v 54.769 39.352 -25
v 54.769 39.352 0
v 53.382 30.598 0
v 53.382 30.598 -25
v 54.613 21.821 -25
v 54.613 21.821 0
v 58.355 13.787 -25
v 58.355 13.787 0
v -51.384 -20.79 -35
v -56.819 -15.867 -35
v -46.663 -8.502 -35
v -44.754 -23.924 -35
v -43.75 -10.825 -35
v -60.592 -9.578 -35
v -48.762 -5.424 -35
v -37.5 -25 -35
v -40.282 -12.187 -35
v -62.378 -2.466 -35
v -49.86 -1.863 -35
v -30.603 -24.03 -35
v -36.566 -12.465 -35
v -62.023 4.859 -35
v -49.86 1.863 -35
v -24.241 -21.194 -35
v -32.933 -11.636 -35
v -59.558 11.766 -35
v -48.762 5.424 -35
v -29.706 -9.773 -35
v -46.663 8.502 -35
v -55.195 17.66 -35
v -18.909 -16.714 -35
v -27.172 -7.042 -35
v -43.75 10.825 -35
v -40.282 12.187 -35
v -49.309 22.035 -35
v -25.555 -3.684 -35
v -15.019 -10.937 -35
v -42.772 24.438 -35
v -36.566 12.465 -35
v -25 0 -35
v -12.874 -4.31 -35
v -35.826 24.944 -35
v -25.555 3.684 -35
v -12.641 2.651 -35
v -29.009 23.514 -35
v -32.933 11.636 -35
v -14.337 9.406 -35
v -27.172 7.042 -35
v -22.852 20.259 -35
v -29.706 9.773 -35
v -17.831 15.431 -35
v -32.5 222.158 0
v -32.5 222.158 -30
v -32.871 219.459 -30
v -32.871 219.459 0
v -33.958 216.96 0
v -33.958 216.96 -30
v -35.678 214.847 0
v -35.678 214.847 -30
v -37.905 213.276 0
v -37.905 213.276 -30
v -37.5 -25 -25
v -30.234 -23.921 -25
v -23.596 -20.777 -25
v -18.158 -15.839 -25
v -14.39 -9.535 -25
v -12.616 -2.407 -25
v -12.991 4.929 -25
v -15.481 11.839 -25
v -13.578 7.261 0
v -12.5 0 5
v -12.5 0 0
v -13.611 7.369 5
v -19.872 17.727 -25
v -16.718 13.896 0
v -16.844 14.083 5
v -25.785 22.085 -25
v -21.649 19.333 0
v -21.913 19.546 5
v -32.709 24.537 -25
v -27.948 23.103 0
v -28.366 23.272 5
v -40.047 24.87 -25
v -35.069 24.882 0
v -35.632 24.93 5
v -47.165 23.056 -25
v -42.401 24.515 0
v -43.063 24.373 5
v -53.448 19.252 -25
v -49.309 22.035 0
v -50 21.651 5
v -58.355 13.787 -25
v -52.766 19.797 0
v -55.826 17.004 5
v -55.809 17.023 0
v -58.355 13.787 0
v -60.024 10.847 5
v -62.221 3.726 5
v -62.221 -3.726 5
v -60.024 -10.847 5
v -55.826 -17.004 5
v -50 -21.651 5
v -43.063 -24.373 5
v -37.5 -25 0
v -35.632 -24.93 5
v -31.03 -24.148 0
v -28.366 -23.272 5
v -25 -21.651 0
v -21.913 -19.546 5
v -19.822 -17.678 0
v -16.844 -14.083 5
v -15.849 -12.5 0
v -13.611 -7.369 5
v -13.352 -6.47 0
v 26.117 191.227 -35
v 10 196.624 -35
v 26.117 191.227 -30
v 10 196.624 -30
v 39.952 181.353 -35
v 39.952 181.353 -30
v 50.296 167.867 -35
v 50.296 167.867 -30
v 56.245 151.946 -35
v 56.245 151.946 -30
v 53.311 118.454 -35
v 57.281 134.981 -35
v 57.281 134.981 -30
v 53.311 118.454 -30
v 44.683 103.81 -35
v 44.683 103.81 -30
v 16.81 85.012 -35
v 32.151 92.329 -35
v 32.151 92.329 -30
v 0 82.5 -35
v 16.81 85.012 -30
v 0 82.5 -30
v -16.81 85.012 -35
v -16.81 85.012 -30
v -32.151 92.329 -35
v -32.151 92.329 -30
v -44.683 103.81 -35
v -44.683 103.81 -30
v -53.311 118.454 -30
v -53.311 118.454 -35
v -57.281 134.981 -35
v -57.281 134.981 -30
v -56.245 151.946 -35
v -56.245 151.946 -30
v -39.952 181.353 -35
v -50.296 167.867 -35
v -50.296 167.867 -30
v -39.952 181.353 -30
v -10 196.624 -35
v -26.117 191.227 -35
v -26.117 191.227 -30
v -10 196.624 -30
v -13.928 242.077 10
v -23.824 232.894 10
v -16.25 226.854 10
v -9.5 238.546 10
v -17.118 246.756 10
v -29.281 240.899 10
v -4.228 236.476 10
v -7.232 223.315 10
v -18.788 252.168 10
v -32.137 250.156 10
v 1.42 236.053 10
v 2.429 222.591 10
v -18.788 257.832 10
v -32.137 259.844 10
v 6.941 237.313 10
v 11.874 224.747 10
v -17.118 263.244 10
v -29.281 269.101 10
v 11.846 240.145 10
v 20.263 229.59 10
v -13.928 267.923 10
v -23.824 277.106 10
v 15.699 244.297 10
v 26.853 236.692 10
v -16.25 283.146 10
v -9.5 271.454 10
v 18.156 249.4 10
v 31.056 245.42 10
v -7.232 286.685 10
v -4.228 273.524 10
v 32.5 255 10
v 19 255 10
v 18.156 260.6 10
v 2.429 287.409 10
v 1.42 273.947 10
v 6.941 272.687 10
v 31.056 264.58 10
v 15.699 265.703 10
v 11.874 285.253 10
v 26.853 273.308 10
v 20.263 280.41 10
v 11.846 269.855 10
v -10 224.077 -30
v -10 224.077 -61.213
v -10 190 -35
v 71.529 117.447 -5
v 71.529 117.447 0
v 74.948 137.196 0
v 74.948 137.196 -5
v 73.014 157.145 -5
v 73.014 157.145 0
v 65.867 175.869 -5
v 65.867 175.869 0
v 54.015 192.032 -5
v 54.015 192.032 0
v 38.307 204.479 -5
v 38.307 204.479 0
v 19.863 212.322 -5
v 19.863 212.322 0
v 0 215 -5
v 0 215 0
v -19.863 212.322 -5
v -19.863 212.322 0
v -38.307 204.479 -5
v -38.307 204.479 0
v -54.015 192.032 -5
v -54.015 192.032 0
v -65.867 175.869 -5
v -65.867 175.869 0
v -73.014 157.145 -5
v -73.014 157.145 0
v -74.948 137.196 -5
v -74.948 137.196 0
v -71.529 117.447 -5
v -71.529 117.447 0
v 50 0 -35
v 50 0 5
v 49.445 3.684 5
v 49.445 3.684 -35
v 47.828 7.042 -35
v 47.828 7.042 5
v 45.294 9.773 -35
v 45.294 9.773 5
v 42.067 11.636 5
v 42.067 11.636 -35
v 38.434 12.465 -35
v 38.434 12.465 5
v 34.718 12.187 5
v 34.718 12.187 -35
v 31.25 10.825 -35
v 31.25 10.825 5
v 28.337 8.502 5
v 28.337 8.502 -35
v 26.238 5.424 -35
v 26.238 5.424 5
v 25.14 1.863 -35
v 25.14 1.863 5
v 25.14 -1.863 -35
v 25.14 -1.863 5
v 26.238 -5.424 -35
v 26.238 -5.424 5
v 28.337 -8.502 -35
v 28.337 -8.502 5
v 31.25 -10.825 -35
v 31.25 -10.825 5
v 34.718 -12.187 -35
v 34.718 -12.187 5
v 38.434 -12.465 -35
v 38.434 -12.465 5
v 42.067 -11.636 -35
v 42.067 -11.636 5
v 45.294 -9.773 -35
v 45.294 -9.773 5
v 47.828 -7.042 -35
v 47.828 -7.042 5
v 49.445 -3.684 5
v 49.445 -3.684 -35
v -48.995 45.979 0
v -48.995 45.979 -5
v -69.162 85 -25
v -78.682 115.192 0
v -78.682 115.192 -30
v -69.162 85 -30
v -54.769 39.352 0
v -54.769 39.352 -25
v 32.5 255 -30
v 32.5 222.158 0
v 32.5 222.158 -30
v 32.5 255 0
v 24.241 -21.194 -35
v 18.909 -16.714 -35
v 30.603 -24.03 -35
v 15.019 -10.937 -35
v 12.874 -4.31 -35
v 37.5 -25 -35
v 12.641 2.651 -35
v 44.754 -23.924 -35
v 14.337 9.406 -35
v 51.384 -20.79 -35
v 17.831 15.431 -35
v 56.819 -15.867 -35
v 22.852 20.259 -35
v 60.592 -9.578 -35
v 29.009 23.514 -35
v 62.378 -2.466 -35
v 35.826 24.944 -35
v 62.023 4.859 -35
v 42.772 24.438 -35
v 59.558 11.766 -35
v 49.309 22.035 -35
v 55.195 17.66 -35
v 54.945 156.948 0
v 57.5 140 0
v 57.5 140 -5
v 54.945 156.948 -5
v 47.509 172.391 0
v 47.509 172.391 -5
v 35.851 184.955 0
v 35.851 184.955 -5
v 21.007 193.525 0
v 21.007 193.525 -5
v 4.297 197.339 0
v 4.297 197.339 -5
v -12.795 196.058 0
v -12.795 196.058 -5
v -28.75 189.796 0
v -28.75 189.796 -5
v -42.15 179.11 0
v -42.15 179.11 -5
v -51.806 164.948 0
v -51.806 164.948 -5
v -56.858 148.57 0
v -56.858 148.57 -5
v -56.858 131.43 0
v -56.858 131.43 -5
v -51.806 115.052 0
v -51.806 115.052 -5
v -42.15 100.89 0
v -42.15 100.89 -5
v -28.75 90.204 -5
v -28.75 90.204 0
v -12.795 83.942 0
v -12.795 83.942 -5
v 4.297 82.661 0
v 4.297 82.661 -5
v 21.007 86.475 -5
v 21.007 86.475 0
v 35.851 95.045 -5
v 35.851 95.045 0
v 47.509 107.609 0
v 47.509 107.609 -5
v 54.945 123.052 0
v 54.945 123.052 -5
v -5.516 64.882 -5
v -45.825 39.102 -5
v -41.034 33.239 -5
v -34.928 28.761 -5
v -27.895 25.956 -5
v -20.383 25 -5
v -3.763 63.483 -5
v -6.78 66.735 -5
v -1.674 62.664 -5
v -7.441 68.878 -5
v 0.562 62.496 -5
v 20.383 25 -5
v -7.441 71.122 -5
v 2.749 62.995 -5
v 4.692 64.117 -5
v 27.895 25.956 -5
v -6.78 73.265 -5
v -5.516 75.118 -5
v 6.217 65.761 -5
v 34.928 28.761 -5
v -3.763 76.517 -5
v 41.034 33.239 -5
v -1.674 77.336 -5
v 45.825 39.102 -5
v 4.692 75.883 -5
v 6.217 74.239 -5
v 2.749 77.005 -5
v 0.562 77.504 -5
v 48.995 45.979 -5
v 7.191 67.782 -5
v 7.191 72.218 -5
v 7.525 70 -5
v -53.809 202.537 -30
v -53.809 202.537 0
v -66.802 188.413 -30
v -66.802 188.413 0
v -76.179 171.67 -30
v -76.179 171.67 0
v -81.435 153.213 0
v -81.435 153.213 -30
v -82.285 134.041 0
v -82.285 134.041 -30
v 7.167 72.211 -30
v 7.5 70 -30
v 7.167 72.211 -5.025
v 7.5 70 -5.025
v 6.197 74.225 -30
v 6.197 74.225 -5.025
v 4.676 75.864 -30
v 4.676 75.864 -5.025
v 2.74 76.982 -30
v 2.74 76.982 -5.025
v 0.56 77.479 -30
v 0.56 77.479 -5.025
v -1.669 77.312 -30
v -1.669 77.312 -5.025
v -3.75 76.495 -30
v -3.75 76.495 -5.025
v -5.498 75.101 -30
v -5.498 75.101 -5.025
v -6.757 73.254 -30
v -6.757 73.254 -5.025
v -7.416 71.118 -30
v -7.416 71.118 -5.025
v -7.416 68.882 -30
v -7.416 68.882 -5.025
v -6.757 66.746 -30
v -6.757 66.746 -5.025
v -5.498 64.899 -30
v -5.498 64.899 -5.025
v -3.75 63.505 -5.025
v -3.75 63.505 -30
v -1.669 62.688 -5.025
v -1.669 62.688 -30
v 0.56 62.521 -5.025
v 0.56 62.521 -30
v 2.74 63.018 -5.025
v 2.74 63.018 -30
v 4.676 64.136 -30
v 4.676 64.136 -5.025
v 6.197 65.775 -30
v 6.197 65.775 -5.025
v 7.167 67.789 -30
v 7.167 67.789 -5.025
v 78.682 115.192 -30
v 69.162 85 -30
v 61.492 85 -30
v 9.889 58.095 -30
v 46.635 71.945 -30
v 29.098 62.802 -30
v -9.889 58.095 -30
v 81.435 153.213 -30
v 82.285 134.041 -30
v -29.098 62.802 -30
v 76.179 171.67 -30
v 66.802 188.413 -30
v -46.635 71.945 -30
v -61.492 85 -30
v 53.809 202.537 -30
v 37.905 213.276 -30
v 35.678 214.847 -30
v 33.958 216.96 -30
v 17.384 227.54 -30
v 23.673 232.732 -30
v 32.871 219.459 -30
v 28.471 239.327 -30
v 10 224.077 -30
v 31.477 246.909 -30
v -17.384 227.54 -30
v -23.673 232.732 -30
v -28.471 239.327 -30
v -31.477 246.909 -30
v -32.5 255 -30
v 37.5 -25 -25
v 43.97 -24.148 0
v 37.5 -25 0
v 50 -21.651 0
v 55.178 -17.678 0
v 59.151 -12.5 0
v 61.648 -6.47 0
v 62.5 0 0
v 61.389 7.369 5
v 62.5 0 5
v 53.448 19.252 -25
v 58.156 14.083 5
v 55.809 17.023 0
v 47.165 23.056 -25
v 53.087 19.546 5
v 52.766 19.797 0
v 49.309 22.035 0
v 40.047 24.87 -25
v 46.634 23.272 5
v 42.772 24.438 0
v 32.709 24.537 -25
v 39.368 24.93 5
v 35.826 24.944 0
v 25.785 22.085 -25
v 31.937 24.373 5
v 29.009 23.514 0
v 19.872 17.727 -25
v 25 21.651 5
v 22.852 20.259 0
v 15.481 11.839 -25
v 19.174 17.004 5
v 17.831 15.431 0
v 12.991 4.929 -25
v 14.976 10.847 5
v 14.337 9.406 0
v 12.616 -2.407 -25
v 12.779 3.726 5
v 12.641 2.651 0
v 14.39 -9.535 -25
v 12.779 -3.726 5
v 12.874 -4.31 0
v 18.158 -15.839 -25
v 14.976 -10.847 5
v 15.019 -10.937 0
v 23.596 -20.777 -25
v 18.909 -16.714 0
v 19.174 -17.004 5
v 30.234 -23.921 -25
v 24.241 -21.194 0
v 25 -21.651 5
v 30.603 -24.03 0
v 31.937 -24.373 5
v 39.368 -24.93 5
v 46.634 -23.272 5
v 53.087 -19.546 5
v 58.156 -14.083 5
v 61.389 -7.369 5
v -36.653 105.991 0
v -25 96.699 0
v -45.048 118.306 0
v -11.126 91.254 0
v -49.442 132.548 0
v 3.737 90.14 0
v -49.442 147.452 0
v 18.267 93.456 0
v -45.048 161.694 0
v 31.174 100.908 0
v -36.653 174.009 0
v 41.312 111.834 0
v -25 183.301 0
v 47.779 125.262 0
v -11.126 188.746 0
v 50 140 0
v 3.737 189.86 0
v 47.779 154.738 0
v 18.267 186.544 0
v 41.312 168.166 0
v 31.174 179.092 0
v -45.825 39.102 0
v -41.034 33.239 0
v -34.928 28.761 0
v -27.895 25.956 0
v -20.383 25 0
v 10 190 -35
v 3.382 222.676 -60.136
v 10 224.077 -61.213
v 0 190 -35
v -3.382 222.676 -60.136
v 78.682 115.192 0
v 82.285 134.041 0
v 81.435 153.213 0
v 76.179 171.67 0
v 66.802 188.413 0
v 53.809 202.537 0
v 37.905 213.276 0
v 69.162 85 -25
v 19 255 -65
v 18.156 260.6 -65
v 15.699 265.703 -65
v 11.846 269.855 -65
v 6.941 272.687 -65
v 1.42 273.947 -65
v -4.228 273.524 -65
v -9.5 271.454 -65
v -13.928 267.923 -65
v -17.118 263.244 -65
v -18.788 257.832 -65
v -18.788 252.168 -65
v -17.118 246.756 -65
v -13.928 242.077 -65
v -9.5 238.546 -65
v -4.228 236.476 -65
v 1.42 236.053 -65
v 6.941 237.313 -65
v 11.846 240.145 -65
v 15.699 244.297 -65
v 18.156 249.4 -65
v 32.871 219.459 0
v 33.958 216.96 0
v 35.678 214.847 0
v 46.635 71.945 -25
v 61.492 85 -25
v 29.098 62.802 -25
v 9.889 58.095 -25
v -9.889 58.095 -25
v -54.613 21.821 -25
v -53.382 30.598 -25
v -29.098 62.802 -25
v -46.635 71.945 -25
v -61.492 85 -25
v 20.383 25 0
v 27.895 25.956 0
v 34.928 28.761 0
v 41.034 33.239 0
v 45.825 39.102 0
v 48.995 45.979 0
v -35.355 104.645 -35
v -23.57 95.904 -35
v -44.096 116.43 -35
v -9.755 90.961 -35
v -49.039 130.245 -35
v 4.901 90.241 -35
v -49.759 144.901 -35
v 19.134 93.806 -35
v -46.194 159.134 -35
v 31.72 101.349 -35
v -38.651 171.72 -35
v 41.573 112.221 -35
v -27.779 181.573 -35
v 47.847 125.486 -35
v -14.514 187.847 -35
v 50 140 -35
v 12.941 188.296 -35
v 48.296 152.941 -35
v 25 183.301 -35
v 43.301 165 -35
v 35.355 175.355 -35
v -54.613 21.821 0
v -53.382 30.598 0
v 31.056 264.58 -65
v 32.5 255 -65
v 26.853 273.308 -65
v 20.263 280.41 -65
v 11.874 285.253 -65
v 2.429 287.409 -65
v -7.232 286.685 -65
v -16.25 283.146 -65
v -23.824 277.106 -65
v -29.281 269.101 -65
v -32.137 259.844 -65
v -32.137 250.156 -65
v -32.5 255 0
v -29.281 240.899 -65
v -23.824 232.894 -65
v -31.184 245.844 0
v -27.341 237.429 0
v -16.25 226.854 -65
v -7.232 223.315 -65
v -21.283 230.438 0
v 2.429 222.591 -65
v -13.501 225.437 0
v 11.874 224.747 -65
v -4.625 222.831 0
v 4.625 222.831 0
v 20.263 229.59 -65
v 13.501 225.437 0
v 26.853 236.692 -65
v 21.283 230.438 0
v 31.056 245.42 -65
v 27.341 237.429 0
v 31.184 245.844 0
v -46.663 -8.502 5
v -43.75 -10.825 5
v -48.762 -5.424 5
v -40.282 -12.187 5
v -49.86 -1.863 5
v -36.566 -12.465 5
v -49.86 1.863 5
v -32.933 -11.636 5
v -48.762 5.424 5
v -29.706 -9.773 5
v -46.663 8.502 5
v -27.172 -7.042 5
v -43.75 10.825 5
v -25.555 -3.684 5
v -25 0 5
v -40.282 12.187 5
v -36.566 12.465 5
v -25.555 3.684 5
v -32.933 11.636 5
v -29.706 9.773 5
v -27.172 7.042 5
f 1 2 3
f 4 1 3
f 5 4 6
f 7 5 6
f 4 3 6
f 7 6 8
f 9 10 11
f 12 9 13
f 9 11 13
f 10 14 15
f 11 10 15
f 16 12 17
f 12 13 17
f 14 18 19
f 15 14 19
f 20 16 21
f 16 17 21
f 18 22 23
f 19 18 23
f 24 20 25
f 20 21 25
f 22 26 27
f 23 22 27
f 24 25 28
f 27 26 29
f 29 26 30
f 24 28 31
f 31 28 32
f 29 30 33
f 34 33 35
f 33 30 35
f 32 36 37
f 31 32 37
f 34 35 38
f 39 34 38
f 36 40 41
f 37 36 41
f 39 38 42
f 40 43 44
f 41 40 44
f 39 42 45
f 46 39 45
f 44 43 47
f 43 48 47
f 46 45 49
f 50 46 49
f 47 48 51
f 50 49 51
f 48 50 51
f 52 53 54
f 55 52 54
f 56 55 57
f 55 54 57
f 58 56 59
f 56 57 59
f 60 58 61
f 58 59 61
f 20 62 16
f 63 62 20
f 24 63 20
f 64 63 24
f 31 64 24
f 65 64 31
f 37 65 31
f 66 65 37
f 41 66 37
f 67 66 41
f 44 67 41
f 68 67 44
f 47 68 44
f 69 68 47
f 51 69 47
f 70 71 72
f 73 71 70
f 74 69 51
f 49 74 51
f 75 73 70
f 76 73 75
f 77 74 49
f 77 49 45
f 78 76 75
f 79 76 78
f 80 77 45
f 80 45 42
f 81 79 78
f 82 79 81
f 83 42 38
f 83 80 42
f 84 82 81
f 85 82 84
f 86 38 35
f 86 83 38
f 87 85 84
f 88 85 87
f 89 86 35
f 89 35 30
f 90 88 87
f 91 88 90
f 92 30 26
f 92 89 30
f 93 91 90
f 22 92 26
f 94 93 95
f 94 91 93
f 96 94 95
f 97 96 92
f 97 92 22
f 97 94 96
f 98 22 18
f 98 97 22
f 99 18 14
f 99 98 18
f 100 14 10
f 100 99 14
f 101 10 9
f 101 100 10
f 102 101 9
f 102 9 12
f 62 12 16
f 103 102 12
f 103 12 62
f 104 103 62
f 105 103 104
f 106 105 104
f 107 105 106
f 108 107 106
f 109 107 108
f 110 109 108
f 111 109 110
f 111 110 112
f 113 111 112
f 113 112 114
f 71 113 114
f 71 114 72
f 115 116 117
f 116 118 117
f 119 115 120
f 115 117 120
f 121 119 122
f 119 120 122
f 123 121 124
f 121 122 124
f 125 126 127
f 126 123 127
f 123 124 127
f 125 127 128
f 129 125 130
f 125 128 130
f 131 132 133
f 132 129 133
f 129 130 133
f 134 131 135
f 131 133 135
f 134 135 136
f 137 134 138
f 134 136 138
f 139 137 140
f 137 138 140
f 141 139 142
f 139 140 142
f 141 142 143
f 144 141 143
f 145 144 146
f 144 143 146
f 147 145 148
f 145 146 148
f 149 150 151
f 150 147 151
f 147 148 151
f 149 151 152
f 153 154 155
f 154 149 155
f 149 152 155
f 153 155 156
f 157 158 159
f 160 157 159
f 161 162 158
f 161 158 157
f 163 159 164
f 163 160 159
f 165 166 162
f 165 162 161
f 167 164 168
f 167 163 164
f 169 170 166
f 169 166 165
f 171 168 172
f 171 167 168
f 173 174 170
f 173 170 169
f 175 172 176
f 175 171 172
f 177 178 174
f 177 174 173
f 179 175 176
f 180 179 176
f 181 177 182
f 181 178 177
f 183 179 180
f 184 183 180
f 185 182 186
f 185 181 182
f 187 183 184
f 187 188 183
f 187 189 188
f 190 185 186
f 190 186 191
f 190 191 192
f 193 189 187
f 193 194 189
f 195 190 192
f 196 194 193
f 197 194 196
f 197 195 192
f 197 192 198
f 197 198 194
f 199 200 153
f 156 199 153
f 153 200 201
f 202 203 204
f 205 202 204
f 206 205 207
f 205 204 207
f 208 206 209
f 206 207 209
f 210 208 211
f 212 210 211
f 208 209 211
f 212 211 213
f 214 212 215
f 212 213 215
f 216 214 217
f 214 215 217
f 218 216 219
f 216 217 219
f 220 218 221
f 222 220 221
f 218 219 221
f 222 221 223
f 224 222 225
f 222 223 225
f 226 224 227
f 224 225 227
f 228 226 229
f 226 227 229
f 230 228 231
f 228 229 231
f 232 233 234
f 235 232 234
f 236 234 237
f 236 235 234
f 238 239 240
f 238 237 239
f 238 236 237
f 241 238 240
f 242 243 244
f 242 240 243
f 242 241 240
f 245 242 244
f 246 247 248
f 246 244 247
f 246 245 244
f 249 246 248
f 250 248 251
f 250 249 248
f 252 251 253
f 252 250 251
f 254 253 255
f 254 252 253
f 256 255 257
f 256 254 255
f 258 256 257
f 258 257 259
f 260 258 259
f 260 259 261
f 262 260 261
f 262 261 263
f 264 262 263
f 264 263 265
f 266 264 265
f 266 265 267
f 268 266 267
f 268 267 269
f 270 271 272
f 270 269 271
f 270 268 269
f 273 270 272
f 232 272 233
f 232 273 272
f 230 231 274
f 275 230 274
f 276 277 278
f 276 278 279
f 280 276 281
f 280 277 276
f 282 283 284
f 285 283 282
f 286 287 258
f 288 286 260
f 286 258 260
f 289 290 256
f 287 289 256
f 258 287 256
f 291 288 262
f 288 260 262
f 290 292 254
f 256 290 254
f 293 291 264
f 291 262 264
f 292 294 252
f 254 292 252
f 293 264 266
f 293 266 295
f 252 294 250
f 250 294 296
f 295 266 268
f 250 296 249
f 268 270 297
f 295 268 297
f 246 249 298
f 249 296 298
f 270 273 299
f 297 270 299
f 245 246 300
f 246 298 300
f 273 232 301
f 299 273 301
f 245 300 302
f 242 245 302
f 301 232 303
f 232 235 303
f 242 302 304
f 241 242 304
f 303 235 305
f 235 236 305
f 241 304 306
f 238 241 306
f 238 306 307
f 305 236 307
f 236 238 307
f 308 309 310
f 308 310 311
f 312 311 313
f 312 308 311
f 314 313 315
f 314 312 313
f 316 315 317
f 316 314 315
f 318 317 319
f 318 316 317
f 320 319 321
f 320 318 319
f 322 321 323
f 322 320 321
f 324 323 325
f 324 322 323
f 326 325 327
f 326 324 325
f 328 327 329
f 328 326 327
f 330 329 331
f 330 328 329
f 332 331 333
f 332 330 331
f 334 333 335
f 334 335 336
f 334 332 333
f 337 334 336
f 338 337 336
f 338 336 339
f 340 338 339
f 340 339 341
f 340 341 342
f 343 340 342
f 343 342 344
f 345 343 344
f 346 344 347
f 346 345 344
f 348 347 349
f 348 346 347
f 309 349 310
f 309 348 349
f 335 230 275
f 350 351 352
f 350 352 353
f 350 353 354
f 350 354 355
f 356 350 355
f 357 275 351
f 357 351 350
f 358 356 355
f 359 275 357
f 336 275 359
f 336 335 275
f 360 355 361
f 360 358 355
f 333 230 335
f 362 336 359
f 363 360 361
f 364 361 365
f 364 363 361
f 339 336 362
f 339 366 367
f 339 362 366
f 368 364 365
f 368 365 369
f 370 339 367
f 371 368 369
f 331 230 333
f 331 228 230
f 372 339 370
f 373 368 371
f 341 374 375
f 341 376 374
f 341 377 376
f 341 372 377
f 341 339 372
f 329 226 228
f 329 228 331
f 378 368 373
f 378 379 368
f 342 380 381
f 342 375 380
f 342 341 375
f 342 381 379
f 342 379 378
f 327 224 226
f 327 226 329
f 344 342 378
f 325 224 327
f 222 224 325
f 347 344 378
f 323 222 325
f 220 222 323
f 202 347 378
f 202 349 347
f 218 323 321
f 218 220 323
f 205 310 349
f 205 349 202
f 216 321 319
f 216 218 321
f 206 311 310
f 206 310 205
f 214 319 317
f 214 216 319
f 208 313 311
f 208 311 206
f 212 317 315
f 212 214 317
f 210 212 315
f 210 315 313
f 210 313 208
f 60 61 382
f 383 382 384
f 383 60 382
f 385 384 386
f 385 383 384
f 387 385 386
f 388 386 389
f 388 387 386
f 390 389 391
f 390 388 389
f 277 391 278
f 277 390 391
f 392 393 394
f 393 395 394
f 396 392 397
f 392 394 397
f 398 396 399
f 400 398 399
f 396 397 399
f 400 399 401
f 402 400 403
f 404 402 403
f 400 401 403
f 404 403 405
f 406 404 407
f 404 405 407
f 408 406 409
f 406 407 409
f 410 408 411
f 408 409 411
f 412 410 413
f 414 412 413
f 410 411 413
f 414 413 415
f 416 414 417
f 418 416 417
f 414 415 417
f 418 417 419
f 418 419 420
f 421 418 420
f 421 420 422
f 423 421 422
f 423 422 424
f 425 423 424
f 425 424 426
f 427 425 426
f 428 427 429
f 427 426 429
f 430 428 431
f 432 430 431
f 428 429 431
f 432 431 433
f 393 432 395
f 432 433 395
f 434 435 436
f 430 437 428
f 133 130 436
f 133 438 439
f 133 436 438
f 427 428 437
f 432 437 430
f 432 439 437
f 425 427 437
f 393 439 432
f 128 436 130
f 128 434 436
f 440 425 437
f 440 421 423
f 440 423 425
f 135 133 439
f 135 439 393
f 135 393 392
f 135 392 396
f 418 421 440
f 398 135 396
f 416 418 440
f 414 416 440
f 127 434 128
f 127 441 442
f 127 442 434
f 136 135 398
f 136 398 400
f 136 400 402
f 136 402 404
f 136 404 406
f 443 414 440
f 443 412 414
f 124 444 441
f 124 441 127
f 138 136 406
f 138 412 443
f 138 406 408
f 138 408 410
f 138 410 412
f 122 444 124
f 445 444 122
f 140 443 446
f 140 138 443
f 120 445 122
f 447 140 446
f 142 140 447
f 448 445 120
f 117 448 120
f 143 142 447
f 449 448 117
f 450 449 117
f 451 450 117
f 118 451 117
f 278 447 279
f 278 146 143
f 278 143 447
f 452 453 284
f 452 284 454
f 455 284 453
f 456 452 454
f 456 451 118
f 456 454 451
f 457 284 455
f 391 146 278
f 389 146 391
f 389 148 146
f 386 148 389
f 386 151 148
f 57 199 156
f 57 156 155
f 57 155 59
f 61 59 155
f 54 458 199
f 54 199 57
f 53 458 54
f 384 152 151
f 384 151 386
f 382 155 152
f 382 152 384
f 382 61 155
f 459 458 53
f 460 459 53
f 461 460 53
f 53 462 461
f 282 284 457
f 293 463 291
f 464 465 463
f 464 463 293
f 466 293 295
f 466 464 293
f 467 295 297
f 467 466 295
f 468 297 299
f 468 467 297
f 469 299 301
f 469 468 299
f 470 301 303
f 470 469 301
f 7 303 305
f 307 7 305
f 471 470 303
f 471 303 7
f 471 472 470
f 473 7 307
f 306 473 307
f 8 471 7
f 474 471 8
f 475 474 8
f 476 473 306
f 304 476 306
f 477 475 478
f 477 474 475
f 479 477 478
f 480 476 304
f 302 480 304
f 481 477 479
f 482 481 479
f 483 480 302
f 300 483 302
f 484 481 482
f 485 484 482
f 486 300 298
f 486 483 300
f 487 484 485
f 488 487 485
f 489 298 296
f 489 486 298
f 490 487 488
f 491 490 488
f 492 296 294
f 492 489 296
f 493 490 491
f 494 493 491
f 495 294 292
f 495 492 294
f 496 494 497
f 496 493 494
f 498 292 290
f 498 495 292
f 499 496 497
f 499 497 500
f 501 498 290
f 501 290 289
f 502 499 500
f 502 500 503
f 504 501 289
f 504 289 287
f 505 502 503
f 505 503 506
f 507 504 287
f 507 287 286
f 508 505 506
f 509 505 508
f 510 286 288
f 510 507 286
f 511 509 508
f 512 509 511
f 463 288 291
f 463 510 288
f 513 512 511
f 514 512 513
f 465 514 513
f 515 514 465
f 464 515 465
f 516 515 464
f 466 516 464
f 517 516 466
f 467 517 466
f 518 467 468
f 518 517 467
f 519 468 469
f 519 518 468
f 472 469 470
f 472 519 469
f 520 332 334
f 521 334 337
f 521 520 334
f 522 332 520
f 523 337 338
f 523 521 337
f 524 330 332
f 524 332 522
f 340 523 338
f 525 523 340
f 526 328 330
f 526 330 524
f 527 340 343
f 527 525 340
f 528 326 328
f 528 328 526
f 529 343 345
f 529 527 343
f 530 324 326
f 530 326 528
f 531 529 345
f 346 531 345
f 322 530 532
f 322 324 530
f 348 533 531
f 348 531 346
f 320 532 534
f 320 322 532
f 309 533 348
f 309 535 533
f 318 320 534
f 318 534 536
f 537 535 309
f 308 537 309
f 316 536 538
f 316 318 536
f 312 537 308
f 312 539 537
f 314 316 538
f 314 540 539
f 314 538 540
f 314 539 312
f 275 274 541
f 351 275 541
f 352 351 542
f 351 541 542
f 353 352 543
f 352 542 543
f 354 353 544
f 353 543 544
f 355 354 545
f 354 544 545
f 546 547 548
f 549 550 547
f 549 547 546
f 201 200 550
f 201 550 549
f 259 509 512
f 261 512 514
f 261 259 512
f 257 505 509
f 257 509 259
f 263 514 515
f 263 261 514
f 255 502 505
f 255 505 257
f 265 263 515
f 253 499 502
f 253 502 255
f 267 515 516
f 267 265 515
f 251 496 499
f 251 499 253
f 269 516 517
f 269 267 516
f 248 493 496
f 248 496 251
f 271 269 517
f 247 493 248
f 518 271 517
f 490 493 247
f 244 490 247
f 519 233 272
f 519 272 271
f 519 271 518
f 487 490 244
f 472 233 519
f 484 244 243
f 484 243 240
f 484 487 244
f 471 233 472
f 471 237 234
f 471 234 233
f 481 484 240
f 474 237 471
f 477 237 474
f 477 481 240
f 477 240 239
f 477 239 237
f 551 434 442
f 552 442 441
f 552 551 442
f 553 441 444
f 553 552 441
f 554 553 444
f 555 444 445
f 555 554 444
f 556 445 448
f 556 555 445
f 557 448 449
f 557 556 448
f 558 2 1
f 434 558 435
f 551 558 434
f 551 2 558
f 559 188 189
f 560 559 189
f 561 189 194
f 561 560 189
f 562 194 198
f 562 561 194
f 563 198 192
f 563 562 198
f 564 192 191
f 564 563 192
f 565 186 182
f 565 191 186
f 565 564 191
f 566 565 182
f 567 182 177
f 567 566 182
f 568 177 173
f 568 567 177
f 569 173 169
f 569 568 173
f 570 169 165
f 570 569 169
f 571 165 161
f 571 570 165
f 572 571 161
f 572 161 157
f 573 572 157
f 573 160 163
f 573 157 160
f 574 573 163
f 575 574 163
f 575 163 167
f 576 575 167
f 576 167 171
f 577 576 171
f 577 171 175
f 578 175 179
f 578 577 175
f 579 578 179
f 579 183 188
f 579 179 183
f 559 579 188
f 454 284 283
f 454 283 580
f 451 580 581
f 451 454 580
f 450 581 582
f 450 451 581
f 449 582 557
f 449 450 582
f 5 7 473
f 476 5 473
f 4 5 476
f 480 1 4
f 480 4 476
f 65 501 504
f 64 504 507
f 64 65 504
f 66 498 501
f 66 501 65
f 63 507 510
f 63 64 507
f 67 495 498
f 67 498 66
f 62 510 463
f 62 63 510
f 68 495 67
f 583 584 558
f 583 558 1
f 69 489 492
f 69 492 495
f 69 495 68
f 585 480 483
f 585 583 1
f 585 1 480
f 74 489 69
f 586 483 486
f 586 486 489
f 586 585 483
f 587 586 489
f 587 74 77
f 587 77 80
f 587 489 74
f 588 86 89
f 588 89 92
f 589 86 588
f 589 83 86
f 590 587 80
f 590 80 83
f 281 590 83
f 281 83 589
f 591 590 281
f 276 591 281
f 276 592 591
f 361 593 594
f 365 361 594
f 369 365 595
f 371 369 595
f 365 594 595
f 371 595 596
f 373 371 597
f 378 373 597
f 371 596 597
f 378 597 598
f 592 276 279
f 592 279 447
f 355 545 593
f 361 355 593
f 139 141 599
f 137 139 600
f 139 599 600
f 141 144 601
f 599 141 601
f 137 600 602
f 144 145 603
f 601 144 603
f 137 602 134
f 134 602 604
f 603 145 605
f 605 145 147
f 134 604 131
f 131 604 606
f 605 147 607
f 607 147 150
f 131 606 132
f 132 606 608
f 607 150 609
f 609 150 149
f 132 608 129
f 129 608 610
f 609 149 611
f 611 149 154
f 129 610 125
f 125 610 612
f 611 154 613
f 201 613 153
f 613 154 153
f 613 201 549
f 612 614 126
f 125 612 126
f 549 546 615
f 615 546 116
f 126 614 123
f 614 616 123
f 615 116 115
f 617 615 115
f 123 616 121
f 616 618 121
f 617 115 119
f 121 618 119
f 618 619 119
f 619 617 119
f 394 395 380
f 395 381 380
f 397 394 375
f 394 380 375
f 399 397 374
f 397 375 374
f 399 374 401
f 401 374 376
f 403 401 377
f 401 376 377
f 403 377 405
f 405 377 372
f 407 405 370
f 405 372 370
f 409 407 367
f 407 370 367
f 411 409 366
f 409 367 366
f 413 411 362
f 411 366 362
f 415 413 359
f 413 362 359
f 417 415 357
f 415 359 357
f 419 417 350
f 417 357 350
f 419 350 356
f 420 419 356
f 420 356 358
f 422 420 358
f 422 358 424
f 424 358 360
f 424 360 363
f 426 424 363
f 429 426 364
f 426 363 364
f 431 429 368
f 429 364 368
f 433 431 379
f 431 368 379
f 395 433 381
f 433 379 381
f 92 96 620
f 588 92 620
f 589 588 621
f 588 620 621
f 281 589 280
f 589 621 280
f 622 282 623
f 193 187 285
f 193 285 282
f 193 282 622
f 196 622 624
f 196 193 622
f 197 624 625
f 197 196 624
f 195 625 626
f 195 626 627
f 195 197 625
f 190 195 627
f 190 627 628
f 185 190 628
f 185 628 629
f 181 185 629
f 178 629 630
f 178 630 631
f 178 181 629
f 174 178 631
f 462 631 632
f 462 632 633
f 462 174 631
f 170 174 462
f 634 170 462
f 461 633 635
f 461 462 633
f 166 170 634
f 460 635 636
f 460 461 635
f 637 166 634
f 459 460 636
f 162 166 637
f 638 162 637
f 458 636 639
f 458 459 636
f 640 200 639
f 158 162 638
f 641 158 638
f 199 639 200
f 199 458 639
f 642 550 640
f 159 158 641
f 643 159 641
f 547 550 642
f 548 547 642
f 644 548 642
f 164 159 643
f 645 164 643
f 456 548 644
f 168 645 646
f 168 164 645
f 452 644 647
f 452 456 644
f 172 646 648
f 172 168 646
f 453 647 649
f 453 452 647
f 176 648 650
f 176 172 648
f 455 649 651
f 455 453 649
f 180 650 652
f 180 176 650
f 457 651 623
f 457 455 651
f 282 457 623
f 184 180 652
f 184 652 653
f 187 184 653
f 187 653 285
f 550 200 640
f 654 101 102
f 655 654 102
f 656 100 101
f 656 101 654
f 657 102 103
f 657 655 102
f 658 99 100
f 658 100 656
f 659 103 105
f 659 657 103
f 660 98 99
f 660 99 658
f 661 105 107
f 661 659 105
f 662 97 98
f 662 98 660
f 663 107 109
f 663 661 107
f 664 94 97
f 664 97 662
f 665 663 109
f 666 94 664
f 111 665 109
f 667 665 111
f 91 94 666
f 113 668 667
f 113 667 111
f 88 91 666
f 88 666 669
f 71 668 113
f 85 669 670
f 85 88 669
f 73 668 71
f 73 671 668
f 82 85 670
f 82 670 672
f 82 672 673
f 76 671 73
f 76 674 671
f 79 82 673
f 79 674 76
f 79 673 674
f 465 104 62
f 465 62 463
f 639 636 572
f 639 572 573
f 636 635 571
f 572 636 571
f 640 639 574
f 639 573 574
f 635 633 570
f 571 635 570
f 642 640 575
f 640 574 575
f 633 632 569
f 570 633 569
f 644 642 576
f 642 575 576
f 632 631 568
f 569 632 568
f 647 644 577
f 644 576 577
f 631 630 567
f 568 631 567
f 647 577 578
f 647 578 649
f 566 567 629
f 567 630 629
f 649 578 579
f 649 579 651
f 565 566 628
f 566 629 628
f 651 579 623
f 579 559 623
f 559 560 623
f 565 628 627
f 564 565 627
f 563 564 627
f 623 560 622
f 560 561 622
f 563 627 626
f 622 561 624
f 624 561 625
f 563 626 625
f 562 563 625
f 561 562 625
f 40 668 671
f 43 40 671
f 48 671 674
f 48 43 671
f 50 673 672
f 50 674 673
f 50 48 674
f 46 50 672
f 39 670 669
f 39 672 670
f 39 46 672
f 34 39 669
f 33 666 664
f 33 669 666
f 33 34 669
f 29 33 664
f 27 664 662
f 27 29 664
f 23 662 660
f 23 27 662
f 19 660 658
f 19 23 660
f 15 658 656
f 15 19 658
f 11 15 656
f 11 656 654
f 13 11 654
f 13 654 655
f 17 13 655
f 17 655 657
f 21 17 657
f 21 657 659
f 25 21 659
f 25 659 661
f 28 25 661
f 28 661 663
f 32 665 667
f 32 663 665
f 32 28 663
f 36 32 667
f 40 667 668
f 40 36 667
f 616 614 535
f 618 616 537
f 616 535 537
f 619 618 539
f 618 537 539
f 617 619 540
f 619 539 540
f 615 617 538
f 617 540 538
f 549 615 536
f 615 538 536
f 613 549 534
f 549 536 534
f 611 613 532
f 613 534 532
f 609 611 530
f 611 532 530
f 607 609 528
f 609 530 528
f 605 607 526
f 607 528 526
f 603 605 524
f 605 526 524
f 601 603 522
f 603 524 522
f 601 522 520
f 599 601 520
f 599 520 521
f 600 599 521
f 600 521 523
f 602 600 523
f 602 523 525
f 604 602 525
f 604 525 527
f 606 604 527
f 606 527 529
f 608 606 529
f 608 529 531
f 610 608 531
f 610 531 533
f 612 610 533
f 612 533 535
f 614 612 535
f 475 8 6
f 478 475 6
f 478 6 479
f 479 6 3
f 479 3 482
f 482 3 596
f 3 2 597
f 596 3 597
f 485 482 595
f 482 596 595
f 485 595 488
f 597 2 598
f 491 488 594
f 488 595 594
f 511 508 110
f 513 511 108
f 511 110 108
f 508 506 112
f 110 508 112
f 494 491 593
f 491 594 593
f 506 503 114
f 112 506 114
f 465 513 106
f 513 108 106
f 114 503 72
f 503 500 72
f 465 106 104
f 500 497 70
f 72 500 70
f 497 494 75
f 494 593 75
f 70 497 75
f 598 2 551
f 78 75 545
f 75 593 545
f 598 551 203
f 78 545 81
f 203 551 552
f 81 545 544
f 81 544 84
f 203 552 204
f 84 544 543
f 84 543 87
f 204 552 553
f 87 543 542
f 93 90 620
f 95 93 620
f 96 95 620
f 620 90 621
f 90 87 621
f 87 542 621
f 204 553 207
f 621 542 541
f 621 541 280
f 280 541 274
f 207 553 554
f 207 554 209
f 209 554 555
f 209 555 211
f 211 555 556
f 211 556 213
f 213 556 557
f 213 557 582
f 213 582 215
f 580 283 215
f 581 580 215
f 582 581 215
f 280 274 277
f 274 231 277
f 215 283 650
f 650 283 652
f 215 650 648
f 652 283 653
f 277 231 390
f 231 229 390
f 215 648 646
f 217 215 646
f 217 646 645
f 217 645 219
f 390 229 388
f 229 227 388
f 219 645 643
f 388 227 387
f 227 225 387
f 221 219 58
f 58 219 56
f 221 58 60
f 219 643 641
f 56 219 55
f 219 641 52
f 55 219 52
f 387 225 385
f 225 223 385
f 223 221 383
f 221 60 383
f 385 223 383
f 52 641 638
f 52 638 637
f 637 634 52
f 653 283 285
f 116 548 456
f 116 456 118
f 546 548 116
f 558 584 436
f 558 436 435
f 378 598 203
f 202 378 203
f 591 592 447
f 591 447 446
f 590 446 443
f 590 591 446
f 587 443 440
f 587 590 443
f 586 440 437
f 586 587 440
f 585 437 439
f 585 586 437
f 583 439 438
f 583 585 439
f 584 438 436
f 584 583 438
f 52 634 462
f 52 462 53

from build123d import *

# Parameters (mm, degrees)
SKETCH1_R               = 50
BOSS_EXTRUDE1_DEPTH     = 35
BOSS_EXTRUDE2_START     = 5
SKETCH1_4_R             = 25
SKETCH1_4_R_2           = 12.5
BOSS_EXTRUDE2_DEPTH     = 40
BOSS_EXTRUDE3_START     = 10
SKETCH1_5_R             = 32.5
BOSS_EXTRUDE3_DEPTH     = 75
SKETCH2_R               = 57.5
CUT_EXTRUDE1_DEPTH      = 5
FILLET1_R               = 10
CUT_EXTRUDE2_START      = -5
CUT_EXTRUDE2_OUTLINE_R  = 57.5
CUT_EXTRUDE2_DEPTH      = 5
CUT_EXTRUDE2_START_2    = -35
CUT_EXTRUDE2_2_DEPTH    = 30
CUT_EXTRUDE3_DEPTH      = 302.76563754
CUT_EXTRUDE3_DEPTH_BACK = 5
RIB1_REACH              = 308.084
SKETCH5_WALL_W          = 655.171326186
SKETCH5_WALL_H          = 20
CUT_EXTRUDE4_DEPTH      = 307.084138759
CUT_EXTRUDE4_DEPTH_BACK = 307.084138759
SKETCH1_6_R             = 12.5
SKETCH1_6_R_2           = 19


# Read off the part's stored shape, not the designer's step: Cut-Extrude2, Ø15.0 (15) Diameter Hole1
with BuildPart() as part:
    # Sketch1 → Boss-Extrude1 (new body)
    with BuildSketch(Plane.XY):
        with BuildLine():
            ThreePointArc((-32.5, 215.828754441), (-74.981933284, 174.408715189), (-78.681648437, 115.191771541))
            Line((-78.681648437, 115.191771541), (-49.309407385, 22.034924488))
            ThreePointArc((-49.309407385, 22.034924488), (-61.74740308, -6.087975353), (-37.5, -25))
            Line((-37.5, -25), (37.5, -25))
            ThreePointArc((37.5, -25), (61.74740308, -6.087975353), (49.309407385, 22.034924488))
            Line((49.309407385, 22.034924488), (78.681648437, 115.191771541))
            ThreePointArc((78.681648437, 115.191771541), (74.981933284, 174.408715189), (32.5, 215.828754441))
            Line((32.5, 215.828754441), (32.5, 255))
            ThreePointArc((32.5, 255), (0, 287.5), (-32.5, 255))
            Line((-32.5, 255), (-32.5, 215.828754441))
        make_face()
        with Locations((0, 140)):
            Circle(SKETCH1_R, mode=Mode.SUBTRACT)
    extrude(amount=-BOSS_EXTRUDE1_DEPTH)

    # Sketch1<4> → Boss-Extrude2 (add)
    # profile 1 of 3: a face of its own
    with BuildSketch(Plane.XY.offset(BOSS_EXTRUDE2_START)):
        with Locations((-37.5, 0)):
            Circle(SKETCH1_4_R)
        with Locations((-37.5, 0)):
            Circle(SKETCH1_4_R_2, mode=Mode.SUBTRACT)
    # profile 2 of 3: a face of its own
    with BuildSketch(Plane.XY.offset(BOSS_EXTRUDE2_START)):
        with Locations((-37.5, 0)):
            Circle(SKETCH1_4_R_2)
    # profile 3 of 3: a face of its own
    with BuildSketch(Plane.XY.offset(BOSS_EXTRUDE2_START)):
        with Locations((37.5, 0)):
            Circle(SKETCH1_4_R)
    extrude(amount=-BOSS_EXTRUDE2_DEPTH)

    # Sketch1<5> → Boss-Extrude3 (add)
    with BuildSketch(Plane.XY.offset(BOSS_EXTRUDE3_START)):
        with Locations((0, 255)):
            Circle(SKETCH1_5_R)
    extrude(amount=-BOSS_EXTRUDE3_DEPTH)

    # Sketch2 → Cut-Extrude1 (cut)
    with BuildSketch(Plane.XY):
        with BuildLine():
            Line((-71.528771306, 117.447065037), (-48.994922099, 45.978826015))
            ThreePointArc((-48.994922099, 45.978826015), (-38.122703028, 30.806661872), (-20.383413577, 25))
            Line((-20.383413577, 25), (20.383413577, 25))
            ThreePointArc((20.383413577, 25), (38.122703028, 30.806661872), (48.994922099, 45.978826015))
            Line((48.994922099, 45.978826015), (71.528771306, 117.447065037))
            ThreePointArc((71.528771306, 117.447065037), (0, 215), (-71.528771306, 117.447065037))
        make_face()
        with Locations((0, 140)):
            Circle(SKETCH2_R, mode=Mode.SUBTRACT)
    extrude(amount=-CUT_EXTRUDE1_DEPTH, mode=Mode.SUBTRACT)

    # Fillet1
    fillet1_edges = [part.edges().sort_by_distance(p)[0] for p in [
        (-32.5, 215.828754441, -17.5),
        (32.5, 215.828754441, -17.5),
    ]]
    fillet(fillet1_edges, radius=FILLET1_R)

    # Cut-Extrude2 outline → Cut-Extrude2 (cut)
    with BuildSketch(Plane(origin=(0, 0, -35), x_dir=(-1, 0, 0), z_dir=(0, 0, -1)).offset(CUT_EXTRUDE2_START)):
        with BuildLine():
            Line((-78.681648437, 115.191771541), (-49.309407385, 22.034924488))
            ThreePointArc((-49.309407385, 22.034924488), (-13.25259692, 6.087975353), (-37.5, -25))
            Line((-37.5, -25), (37.5, -25))
            ThreePointArc((37.5, -25), (13.25259692, 6.087975353), (49.309407385, 22.034924488))
            Line((49.309407385, 22.034924488), (78.681648437, 115.191771541))
            ThreePointArc((78.681648437, 115.191771541), (76.179286423, 171.669643512), (37.905405405, 213.276396207))
            ThreePointArc((37.905405405, 213.276396207), (33.957578038, 216.959631177), (32.5, 222.158383626))
            Line((32.5, 222.158383626), (32.5, 255))
            ThreePointArc((32.5, 255), (0, 222.5), (-32.5, 255))
            Line((-32.5, 255), (-32.5, 222.158383626))
            ThreePointArc((-32.5, 222.158383626), (-33.957578038, 216.959631177), (-37.905405405, 213.276396207))
            ThreePointArc((-37.905405405, 213.276396207), (-76.179286423, 171.669643512), (-78.681648437, 115.191771541))
        make_face()
        with Locations((0, 140)):
            Circle(CUT_EXTRUDE2_OUTLINE_R, mode=Mode.SUBTRACT)
    extrude(amount=CUT_EXTRUDE2_DEPTH, mode=Mode.SUBTRACT)

    # Cut-Extrude2 2 outline → Cut-Extrude2 2 (add)
    with BuildSketch(Plane(origin=(0, 0, -35), x_dir=(-1, 0, 0), z_dir=(0, 0, -1)).offset(CUT_EXTRUDE2_START_2)):
        with BuildLine():
            Line((-49.309407385, 22.034924488), (-54.769381812, 39.351751001))
            ThreePointArc((-54.769381812, 39.351751001), (-53.67166818, 26.163789409), (-58.354950152, 13.786625916))
            ThreePointArc((-58.354950152, 13.786625916), (-54.34484107, 18.472989182), (-49.309407385, 22.034924488))
        make_face()
        with BuildLine():
            Line((54.769381812, 39.351751001), (49.309407385, 22.034924488))
            ThreePointArc((49.309407385, 22.034924488), (54.34484107, 18.472989182), (58.354950152, 13.786625916))
            ThreePointArc((58.354950152, 13.786625916), (53.67166818, 26.163789409), (54.769381812, 39.351751001))
        make_face()
    extrude(amount=CUT_EXTRUDE2_2_DEPTH)

    # Sketch4 → Cut-Extrude3 (cut, two sides: drawn at the far end of the back side and taken through both)
    with BuildSketch(Plane(origin=(0, 0, -30), x_dir=(-1, 0, 0), z_dir=(0, 0, -1)).offset(-CUT_EXTRUDE3_DEPTH_BACK)):
        with BuildLine():
            Line((-61.491869381, 85), (-69.162219436, 85))
            Line((-69.162219436, 85), (-54.769381812, 39.351751001))
            ThreePointArc((-54.769381812, 39.351751001), (-53.67166818, 26.163789409), (-58.354950152, 13.786625916))
            ThreePointArc((-58.354950152, 13.786625916), (-15.481080318, 11.839221936), (-37.5, -25))
            Line((-37.5, -25), (37.5, -25))
            ThreePointArc((37.5, -25), (15.481080318, 11.839221936), (58.354950152, 13.786625916))
            ThreePointArc((58.354950152, 13.786625916), (53.67166818, 26.163789409), (54.769381812, 39.351751001))
            Line((54.769381812, 39.351751001), (69.162219436, 85))
            Line((69.162219436, 85), (61.491869381, 85))
            ThreePointArc((61.491869381, 85), (0, 57.5), (-61.491869381, 85))
        make_face()
    extrude(amount=CUT_EXTRUDE3_DEPTH + CUT_EXTRUDE3_DEPTH_BACK, mode=Mode.SUBTRACT)

    # Sketch5 wall → Rib1 (add, up to next)
    with BuildSketch(Plane(origin=(0, 206.25, -47.5), x_dir=(0, -0.792623989105, 0.60971076085), z_dir=(0, -0.60971076085, -0.792623989105)), mode=Mode.PRIVATE) as rib1_sk1:
        Rectangle(SKETCH5_WALL_W, SKETCH5_WALL_H)
    rib1_tool1 = extrude(rib1_sk1.sketch, amount=-RIB1_REACH, mode=Mode.PRIVATE) - part.part
    add(rib1_tool1.solids().sort_by_distance((0, 206.25, -47.5))[0])

    # Sketch1<6> → Cut-Extrude4 (cut, two sides: drawn at the far end of the back side and taken through both)
    with BuildSketch(Plane.XY.offset(-CUT_EXTRUDE4_DEPTH_BACK)):
        with Locations((-37.5, 0)):
            Circle(SKETCH1_6_R)
        with Locations((37.5, 0)):
            Circle(SKETCH1_6_R)
        with Locations((0, 255)):
            Circle(SKETCH1_6_R_2)
    extrude(amount=CUT_EXTRUDE4_DEPTH + CUT_EXTRUDE4_DEPTH_BACK, mode=Mode.SUBTRACT)

    # Ø15.0 (15) Diameter Hole1 outline → Ø15.0 (15) Diameter Hole1 (revolve, cut)
    with BuildSketch(Plane.XZ.offset(-70)):
        Polygon((0, -30), (7.5, -30), (7.5, -5.025), (7.525, -5), (0, -5), align=None)
    revolve(axis=Axis((0, 70, 0), (0, 0, 1)), mode=Mode.SUBTRACT)


solid = part.part
